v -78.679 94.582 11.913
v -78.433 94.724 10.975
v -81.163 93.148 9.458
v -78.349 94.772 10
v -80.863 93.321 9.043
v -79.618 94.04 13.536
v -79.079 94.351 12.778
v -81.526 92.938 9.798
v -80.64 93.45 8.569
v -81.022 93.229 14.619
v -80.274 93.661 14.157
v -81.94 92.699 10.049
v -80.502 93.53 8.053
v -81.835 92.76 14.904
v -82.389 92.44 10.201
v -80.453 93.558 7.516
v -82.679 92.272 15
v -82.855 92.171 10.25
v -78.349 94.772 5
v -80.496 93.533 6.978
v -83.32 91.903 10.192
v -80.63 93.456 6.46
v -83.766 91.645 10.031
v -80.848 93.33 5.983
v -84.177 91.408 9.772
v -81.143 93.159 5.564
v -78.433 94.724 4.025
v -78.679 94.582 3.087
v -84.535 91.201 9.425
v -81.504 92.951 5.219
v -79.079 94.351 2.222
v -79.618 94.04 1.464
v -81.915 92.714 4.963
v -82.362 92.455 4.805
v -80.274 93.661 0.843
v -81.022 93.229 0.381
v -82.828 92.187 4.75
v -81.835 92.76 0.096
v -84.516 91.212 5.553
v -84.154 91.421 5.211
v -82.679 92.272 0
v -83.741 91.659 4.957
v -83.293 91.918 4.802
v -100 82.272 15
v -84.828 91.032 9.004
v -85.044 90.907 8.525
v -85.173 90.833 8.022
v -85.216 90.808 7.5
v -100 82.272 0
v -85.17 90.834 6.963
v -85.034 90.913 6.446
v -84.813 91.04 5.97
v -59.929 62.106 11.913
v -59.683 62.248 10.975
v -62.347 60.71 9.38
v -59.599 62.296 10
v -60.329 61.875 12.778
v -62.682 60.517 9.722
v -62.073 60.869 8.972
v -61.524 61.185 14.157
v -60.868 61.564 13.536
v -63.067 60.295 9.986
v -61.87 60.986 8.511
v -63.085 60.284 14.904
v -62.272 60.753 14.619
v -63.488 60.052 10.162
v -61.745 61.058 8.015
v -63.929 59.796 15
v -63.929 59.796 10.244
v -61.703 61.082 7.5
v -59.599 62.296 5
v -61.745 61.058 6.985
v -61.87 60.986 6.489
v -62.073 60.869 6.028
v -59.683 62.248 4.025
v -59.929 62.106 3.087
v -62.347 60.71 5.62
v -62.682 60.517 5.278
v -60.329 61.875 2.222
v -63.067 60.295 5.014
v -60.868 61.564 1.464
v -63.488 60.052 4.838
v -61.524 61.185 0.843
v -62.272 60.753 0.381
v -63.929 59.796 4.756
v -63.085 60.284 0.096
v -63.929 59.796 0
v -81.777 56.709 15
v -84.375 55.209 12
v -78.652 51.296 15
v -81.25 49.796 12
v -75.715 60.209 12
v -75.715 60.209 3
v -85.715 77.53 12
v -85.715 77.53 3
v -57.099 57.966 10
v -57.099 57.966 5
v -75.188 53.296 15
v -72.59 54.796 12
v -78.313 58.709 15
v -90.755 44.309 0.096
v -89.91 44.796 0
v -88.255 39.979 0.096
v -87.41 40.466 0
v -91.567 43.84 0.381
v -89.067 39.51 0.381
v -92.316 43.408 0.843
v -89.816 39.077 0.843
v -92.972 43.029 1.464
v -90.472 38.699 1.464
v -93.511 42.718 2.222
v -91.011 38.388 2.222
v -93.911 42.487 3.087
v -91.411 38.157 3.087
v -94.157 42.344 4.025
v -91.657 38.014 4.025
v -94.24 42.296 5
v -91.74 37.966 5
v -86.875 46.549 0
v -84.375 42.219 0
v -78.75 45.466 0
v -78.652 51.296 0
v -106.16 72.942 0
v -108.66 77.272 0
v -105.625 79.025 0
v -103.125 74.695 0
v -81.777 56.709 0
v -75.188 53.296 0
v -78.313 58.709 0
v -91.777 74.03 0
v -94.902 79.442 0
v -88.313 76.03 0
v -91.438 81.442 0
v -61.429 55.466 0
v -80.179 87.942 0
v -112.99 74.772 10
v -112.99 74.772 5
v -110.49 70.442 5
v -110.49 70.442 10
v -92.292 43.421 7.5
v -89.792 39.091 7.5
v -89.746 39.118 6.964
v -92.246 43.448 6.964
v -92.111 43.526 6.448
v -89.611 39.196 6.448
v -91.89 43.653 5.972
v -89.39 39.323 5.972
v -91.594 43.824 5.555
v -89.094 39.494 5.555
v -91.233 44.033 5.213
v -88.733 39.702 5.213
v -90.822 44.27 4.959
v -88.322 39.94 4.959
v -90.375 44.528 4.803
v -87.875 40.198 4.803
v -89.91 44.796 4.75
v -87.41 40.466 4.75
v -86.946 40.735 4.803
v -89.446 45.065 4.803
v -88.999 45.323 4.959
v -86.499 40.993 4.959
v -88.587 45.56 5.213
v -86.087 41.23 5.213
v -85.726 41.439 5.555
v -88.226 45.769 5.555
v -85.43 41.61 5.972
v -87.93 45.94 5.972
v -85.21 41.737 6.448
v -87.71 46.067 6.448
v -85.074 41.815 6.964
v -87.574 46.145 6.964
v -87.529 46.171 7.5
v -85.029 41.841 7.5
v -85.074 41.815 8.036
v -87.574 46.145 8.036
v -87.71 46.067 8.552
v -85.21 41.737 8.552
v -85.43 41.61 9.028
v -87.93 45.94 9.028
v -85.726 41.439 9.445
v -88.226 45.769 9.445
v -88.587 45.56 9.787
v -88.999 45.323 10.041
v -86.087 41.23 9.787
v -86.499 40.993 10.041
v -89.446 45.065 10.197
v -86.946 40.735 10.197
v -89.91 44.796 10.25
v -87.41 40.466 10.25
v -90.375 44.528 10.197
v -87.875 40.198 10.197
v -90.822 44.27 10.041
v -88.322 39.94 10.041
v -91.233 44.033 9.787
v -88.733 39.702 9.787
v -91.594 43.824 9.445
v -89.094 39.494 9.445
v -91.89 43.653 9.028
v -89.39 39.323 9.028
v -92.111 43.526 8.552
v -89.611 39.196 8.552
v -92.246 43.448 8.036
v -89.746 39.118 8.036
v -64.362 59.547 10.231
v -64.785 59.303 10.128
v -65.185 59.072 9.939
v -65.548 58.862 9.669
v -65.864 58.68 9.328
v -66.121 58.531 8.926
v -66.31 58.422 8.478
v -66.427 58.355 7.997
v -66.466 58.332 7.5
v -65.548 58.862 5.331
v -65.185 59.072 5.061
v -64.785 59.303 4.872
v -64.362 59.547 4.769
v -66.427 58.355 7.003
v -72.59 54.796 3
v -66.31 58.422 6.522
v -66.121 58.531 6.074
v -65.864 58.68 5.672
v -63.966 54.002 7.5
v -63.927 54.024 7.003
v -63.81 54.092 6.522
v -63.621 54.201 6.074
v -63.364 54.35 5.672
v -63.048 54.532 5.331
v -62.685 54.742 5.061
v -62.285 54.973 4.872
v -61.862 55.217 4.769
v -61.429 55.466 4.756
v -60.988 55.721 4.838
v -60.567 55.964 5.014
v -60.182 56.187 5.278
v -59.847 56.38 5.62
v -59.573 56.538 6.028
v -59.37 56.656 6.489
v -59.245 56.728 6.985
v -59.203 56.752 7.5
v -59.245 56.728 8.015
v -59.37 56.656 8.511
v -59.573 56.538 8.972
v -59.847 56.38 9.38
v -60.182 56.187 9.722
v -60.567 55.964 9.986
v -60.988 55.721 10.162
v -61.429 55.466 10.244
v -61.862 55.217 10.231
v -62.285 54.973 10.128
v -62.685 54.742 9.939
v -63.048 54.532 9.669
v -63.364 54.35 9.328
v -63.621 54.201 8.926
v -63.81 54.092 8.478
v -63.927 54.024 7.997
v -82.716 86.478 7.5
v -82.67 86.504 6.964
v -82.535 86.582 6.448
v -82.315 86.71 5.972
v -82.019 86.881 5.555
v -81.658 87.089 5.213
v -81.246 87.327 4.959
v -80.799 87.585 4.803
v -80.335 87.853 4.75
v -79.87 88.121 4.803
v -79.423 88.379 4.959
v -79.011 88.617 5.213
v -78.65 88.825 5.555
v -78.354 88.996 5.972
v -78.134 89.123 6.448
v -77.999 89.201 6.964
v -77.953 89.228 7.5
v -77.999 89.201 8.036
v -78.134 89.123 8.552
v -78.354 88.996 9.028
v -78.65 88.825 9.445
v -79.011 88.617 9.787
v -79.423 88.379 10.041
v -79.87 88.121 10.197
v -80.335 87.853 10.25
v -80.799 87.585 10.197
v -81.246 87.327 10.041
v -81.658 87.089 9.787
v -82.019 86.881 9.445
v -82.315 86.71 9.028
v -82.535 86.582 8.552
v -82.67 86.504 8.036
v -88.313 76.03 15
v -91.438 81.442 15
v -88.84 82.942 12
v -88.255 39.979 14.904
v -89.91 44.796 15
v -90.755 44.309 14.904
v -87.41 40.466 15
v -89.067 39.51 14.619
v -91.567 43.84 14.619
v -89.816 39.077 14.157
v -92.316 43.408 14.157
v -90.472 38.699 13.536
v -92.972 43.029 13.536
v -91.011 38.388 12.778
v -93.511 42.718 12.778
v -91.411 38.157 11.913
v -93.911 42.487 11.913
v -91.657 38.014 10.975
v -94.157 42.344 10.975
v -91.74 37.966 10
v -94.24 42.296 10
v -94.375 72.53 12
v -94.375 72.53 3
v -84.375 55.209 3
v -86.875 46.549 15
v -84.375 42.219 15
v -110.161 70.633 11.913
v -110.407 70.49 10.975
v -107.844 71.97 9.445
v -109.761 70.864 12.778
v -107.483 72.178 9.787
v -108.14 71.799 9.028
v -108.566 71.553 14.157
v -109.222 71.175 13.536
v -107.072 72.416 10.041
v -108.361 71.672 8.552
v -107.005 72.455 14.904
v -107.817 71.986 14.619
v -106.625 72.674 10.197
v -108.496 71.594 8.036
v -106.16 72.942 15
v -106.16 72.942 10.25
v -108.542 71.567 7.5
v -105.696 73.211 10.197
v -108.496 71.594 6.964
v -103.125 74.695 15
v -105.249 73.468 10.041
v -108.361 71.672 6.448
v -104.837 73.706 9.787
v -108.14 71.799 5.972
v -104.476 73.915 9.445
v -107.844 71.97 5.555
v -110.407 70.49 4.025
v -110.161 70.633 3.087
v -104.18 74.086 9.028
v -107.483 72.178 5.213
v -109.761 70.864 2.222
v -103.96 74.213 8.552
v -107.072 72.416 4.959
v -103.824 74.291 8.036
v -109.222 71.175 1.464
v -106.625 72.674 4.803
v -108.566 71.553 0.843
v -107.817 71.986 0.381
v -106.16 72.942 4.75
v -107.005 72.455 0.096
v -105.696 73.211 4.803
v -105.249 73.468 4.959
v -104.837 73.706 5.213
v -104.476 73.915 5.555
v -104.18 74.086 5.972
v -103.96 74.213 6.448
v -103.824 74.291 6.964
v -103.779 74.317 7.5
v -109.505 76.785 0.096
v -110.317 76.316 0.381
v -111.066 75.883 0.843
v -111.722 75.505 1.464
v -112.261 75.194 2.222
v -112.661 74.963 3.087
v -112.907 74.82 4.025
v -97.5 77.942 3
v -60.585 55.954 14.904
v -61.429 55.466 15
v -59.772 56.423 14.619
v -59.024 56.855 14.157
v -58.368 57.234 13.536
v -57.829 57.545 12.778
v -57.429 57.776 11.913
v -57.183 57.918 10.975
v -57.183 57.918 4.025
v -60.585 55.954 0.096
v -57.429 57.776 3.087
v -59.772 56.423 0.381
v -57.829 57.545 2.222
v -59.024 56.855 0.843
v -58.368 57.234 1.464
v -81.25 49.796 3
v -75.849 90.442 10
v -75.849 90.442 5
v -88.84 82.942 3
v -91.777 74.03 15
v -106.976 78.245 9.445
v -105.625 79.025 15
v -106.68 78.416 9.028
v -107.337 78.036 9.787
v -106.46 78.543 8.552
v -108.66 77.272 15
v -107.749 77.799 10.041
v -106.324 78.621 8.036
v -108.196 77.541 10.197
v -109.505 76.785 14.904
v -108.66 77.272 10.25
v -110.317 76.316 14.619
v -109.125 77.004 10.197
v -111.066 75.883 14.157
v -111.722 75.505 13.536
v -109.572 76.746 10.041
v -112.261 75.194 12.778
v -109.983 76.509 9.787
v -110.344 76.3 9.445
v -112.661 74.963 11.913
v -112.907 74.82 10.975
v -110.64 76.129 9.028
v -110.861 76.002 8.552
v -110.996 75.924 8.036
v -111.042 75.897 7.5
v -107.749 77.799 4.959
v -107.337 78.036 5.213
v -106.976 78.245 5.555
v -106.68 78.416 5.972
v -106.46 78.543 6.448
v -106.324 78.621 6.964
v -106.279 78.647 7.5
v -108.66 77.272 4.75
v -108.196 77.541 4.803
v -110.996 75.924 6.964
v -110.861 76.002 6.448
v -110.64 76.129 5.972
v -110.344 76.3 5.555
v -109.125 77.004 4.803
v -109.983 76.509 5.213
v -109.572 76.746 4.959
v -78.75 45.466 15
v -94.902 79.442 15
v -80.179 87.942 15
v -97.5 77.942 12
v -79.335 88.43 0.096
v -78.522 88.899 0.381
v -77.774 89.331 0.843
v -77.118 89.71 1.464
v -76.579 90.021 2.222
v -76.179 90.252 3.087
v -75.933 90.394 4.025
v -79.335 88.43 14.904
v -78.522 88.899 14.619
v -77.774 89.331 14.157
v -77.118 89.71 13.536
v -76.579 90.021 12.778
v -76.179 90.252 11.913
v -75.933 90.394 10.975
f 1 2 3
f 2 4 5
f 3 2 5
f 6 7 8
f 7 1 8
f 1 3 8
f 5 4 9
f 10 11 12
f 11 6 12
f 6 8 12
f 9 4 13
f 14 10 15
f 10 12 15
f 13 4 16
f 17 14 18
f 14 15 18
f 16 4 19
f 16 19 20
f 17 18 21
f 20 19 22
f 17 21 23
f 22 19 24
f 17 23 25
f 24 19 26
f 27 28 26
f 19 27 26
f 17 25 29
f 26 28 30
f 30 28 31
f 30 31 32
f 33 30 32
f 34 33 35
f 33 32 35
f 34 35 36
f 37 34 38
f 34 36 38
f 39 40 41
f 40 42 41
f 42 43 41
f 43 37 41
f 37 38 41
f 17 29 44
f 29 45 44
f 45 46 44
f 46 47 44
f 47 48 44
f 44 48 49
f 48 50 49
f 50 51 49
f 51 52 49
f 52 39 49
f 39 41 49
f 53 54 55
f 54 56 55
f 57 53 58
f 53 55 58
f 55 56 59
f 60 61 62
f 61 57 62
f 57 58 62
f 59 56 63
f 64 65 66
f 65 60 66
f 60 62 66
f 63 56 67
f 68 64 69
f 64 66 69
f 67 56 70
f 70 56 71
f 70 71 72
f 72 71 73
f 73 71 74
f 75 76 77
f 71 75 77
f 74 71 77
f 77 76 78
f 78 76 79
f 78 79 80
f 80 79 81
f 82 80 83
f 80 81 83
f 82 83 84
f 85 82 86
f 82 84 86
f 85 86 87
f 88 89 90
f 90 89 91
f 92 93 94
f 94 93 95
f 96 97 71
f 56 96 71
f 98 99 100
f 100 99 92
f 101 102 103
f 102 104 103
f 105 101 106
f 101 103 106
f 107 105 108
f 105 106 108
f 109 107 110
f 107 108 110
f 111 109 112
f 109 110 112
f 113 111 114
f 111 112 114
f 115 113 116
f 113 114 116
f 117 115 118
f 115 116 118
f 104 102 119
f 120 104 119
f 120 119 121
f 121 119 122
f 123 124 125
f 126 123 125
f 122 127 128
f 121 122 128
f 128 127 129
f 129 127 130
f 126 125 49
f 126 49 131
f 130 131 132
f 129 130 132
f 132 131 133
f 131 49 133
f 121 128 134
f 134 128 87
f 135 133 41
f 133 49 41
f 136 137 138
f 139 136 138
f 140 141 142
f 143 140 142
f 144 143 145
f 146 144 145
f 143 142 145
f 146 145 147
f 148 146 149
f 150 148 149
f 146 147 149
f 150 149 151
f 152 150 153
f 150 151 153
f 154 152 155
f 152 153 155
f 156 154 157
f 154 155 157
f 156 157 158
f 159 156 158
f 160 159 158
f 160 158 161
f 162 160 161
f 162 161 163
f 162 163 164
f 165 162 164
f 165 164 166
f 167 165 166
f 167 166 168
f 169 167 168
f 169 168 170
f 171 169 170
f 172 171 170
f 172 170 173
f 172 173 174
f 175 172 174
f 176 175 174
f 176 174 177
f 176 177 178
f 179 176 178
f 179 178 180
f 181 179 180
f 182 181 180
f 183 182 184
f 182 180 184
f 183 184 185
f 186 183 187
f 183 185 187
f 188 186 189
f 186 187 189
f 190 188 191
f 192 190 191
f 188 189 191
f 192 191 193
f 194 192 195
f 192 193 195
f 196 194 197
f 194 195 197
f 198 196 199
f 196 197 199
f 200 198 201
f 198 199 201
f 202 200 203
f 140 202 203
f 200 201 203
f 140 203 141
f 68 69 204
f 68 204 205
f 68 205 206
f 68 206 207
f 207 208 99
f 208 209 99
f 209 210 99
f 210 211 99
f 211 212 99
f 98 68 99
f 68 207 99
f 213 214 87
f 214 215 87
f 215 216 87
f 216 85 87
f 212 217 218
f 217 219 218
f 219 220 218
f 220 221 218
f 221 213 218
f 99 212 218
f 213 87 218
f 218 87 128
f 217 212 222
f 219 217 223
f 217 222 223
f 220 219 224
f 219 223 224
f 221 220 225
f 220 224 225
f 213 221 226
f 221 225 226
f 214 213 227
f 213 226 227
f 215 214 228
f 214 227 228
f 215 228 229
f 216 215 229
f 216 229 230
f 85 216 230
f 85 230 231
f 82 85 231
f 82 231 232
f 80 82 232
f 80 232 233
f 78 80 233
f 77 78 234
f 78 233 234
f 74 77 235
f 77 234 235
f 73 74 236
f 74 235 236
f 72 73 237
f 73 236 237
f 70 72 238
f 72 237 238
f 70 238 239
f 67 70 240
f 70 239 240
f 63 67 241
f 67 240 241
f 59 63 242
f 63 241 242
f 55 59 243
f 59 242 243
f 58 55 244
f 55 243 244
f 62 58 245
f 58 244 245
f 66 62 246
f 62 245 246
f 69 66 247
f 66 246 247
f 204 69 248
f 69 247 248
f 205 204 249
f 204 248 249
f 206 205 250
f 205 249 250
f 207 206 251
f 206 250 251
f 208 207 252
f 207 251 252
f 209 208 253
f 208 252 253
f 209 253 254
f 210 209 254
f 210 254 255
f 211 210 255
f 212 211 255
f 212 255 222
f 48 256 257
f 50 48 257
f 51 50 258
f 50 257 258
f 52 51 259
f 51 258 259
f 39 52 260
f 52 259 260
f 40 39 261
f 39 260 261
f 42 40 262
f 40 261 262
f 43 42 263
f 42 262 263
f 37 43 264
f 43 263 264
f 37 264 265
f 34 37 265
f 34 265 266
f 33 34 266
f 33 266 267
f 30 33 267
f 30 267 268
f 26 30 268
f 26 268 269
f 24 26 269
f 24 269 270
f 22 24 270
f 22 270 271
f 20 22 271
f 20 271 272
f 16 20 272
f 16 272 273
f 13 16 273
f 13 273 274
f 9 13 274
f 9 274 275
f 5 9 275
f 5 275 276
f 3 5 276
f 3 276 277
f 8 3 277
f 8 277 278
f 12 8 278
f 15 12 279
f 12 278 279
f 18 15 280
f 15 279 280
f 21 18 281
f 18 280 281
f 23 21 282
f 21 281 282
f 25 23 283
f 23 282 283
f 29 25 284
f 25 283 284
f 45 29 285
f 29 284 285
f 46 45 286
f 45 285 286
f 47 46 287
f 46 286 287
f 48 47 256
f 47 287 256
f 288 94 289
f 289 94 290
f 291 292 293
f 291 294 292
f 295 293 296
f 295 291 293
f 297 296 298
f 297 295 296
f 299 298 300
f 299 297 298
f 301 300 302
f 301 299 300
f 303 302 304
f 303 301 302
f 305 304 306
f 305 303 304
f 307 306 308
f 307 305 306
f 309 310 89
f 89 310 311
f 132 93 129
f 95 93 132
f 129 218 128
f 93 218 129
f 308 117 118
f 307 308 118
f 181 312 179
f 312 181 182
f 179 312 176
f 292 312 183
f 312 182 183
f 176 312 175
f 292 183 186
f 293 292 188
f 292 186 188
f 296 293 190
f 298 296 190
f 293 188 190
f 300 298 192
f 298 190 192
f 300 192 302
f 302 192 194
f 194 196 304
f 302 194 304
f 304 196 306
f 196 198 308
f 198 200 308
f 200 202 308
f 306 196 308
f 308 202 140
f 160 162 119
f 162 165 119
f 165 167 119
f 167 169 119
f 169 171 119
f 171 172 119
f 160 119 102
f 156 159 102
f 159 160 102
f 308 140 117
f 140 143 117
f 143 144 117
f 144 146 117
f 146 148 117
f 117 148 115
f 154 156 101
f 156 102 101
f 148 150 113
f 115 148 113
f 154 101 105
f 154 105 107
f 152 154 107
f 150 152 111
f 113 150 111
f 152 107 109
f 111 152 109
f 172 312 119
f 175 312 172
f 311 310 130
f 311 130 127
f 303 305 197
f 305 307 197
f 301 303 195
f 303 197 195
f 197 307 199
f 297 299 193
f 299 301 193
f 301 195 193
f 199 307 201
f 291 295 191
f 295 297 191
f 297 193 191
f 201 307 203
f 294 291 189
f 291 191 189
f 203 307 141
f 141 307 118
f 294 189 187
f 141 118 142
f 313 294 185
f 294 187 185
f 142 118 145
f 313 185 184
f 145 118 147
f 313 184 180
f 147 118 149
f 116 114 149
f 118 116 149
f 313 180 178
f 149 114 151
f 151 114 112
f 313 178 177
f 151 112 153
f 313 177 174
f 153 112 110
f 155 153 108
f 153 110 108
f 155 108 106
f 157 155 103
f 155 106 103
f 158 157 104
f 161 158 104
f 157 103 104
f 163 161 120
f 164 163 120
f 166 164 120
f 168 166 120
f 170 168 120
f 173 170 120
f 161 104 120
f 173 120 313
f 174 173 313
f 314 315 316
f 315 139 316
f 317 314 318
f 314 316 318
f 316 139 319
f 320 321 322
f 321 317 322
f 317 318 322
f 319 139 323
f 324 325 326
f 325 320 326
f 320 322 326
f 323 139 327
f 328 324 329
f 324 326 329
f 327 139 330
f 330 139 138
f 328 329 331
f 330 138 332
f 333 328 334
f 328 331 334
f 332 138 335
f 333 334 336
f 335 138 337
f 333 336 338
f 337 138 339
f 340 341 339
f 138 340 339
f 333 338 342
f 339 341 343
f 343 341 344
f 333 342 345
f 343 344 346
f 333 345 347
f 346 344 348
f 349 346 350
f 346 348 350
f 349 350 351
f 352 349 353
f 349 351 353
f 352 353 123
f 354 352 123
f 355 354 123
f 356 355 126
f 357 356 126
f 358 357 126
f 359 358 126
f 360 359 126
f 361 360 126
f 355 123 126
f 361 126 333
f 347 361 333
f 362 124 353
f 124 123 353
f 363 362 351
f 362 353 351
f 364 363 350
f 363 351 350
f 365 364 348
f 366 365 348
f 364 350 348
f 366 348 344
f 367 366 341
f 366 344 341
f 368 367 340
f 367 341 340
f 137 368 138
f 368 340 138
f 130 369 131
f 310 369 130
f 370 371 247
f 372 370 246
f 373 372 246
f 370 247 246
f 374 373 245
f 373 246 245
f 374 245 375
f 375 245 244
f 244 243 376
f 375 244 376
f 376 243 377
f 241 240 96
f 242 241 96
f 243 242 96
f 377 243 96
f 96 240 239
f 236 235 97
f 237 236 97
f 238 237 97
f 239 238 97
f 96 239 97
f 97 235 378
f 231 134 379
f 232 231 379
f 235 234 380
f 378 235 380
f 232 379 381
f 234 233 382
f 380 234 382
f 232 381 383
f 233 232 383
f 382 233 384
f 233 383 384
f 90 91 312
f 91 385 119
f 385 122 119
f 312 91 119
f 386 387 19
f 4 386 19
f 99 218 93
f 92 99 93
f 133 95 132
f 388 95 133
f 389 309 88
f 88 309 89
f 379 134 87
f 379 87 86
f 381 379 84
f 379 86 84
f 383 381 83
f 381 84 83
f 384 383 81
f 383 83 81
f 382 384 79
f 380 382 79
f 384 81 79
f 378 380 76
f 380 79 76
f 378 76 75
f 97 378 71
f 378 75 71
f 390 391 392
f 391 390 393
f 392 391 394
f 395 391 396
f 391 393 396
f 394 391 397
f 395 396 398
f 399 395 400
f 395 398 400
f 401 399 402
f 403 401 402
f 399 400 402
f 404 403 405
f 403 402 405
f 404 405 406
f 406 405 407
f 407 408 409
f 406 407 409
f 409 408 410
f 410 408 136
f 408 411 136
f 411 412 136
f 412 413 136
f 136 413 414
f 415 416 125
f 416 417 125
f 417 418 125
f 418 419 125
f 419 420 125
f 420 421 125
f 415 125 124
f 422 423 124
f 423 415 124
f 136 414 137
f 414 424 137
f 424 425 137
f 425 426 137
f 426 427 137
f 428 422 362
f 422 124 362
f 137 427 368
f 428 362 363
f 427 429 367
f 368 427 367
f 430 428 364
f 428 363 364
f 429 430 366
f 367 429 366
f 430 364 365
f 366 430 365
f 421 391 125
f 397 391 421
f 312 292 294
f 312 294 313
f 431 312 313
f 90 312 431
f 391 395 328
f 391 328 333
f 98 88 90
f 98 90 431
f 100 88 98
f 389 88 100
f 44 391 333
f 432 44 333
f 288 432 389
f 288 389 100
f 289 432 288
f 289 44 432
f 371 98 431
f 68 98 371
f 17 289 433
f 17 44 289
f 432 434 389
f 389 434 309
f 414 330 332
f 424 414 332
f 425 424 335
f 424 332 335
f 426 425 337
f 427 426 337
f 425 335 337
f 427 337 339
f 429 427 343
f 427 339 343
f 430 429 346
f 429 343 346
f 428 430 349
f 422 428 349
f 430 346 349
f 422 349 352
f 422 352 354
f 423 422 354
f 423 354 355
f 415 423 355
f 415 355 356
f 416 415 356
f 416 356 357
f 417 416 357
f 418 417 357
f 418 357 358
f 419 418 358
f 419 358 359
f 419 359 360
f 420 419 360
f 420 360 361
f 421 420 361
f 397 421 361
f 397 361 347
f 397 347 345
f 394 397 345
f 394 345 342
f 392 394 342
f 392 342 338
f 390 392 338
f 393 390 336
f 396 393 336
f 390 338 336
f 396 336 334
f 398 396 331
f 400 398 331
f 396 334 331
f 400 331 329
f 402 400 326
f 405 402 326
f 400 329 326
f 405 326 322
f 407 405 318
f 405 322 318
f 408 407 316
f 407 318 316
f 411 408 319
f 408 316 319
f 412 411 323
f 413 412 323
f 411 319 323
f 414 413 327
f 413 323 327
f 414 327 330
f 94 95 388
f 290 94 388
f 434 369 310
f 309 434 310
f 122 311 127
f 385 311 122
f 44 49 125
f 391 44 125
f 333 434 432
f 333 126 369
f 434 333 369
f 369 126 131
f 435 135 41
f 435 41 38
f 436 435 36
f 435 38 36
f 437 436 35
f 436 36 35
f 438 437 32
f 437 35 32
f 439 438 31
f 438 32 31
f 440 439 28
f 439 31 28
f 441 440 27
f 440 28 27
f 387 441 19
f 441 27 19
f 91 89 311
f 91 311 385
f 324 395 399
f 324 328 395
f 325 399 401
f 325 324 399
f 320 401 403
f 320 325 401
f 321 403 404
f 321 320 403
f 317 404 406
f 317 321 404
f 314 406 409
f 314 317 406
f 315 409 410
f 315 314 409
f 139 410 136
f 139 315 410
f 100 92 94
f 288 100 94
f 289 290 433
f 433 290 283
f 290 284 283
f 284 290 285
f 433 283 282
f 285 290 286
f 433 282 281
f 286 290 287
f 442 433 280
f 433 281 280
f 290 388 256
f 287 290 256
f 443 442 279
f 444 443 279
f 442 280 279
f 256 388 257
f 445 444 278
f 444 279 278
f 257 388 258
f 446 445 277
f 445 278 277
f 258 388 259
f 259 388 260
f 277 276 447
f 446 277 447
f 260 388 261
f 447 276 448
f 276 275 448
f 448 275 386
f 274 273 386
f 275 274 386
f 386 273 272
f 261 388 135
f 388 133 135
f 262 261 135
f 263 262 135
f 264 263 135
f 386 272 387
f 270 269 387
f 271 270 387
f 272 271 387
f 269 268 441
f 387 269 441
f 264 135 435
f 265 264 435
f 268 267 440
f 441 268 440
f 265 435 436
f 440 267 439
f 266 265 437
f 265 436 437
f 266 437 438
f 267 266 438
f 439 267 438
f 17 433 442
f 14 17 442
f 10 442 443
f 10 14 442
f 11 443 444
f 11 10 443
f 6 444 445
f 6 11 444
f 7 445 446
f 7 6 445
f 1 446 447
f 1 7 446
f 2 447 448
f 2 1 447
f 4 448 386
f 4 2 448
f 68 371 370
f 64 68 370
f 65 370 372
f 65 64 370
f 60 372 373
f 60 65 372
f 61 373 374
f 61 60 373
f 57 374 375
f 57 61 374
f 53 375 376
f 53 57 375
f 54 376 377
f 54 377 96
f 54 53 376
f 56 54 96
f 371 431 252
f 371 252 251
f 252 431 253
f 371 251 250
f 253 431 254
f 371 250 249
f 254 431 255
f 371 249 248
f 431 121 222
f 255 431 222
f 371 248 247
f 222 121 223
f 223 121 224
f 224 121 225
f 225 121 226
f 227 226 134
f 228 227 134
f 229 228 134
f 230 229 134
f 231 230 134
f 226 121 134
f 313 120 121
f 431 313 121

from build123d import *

# Parameters (mm, degrees)
F1_DEPTH = 15
F3_DEPTH = 60
F4_SIZE  = 3
F5_R     = 5


with BuildPart() as f1:
    # F0 (on Top) → F1 (new body)
    with BuildSketch(Plane.XY):
        Polygon((-84.375, 42.2187384345), (-78.75, 45.4663336987), (-61.4294919243, 55.4663336987), (-63.9294919243, 59.7964607176), (-72.5897459622, 54.7964607176), (-75.7147459622, 60.2091194913), (-84.375, 55.2091194913), (-81.25, 49.7964607176), (-86.875, 46.5488654534), align=None)
        Polygon((-61.4294919243, 55.4663336987), (-57.0993649054, 57.9663336987), (-59.5993649054, 62.2964607176), (-63.9294919243, 59.7964607176), align=None)
        Polygon((-91.7403810568, 37.9663336987), (-84.375, 42.2187384345), (-86.875, 46.5488654534), (-94.2403810568, 42.2964607176), align=None)
        Polygon((-84.375, 55.2091194913), (-75.7147459622, 60.2091194913), (-85.7147459622, 77.5296275669), (-87.793790014, 76.329290924), (-94.375, 72.5296275669), align=None)
        Polygon((-87.793790014, 76.329290924), (-85.7147459622, 77.5296275669), (-88.8397459622, 82.9422863406), (-75.8493649054, 90.4422863406), (-78.3493115936, 94.7723526968), (-100, 82.2724133595), (-105.625, 79.0248180953), (-103.125, 74.6946910764), (-97.5, 77.9422863406), (-94.375, 72.5296275669), align=None)
        Polygon((-110.4903810568, 70.4422863406), (-103.125, 74.6946910764), (-105.625, 79.0248180953), (-112.9903810568, 74.7724133595), align=None)
    extrude(amount=F1_DEPTH)

    # F2 (on face) → F3 (cut)
    with BuildSketch(Plane(origin=(-39.375, 68.199500548, 0), x_dir=(0.8660254038, 0.5, 0), z_dir=(0.5, -0.8660254038, 0))):
        with BuildLine():
            ThreePointArc((-52.7163336987, 7.5), (-55.4663336987, 10.25), (-58.2163336987, 7.5))
            Line((-58.2163336987, 7.5), (-55.4663336987, 7.5))
            Line((-55.4663336987, 7.5), (-52.7163336987, 7.5))
        make_face()
        with BuildLine():
            Line((-55.4663336987, 7.5), (-58.2163336987, 7.5))
            ThreePointArc((-58.2163336987, 7.5), (-55.4663336987, 4.75), (-52.7163336987, 7.5))
            Line((-52.7163336987, 7.5), (-55.4663336987, 7.5))
        make_face()
        with BuildLine():
            ThreePointArc((-22.8953336987, 7.5), (-25.6453336987, 10.25), (-28.3953336987, 7.5))
            ThreePointArc((-28.3953336987, 7.5), (-25.6453336987, 4.75), (-22.8953336987, 7.5))
        make_face()
    extrude(amount=-F3_DEPTH, mode=Mode.SUBTRACT)

    # F4
    f4_edges = [f1.edges().sort_by_distance(p)[0] for p in [
        (-89.375, 63.869374, 15),
        (-80.714746, 68.869374, 15),
        (-89.375, 63.869374, 0),
        (-80.714746, 68.869374, 0),
    ]]
    chamfer(f4_edges, length=F4_SIZE)

    # F5
    f5_edges = [f1.edges().sort_by_distance(p)[0] for p in [
        (-92.990381, 40.131397, 0),
        (-111.740381, 72.60735, 0),
        (-111.740381, 72.60735, 15),
        (-92.990381, 40.131397, 15),
        (-58.349365, 60.131397, 15),
        (-58.349365, 60.131397, 0),
        (-77.099338, 92.60732, 15),
        (-77.099338, 92.60732, 0),
    ]]
    fillet(f5_edges, radius=F5_R)


solid = f1.part
